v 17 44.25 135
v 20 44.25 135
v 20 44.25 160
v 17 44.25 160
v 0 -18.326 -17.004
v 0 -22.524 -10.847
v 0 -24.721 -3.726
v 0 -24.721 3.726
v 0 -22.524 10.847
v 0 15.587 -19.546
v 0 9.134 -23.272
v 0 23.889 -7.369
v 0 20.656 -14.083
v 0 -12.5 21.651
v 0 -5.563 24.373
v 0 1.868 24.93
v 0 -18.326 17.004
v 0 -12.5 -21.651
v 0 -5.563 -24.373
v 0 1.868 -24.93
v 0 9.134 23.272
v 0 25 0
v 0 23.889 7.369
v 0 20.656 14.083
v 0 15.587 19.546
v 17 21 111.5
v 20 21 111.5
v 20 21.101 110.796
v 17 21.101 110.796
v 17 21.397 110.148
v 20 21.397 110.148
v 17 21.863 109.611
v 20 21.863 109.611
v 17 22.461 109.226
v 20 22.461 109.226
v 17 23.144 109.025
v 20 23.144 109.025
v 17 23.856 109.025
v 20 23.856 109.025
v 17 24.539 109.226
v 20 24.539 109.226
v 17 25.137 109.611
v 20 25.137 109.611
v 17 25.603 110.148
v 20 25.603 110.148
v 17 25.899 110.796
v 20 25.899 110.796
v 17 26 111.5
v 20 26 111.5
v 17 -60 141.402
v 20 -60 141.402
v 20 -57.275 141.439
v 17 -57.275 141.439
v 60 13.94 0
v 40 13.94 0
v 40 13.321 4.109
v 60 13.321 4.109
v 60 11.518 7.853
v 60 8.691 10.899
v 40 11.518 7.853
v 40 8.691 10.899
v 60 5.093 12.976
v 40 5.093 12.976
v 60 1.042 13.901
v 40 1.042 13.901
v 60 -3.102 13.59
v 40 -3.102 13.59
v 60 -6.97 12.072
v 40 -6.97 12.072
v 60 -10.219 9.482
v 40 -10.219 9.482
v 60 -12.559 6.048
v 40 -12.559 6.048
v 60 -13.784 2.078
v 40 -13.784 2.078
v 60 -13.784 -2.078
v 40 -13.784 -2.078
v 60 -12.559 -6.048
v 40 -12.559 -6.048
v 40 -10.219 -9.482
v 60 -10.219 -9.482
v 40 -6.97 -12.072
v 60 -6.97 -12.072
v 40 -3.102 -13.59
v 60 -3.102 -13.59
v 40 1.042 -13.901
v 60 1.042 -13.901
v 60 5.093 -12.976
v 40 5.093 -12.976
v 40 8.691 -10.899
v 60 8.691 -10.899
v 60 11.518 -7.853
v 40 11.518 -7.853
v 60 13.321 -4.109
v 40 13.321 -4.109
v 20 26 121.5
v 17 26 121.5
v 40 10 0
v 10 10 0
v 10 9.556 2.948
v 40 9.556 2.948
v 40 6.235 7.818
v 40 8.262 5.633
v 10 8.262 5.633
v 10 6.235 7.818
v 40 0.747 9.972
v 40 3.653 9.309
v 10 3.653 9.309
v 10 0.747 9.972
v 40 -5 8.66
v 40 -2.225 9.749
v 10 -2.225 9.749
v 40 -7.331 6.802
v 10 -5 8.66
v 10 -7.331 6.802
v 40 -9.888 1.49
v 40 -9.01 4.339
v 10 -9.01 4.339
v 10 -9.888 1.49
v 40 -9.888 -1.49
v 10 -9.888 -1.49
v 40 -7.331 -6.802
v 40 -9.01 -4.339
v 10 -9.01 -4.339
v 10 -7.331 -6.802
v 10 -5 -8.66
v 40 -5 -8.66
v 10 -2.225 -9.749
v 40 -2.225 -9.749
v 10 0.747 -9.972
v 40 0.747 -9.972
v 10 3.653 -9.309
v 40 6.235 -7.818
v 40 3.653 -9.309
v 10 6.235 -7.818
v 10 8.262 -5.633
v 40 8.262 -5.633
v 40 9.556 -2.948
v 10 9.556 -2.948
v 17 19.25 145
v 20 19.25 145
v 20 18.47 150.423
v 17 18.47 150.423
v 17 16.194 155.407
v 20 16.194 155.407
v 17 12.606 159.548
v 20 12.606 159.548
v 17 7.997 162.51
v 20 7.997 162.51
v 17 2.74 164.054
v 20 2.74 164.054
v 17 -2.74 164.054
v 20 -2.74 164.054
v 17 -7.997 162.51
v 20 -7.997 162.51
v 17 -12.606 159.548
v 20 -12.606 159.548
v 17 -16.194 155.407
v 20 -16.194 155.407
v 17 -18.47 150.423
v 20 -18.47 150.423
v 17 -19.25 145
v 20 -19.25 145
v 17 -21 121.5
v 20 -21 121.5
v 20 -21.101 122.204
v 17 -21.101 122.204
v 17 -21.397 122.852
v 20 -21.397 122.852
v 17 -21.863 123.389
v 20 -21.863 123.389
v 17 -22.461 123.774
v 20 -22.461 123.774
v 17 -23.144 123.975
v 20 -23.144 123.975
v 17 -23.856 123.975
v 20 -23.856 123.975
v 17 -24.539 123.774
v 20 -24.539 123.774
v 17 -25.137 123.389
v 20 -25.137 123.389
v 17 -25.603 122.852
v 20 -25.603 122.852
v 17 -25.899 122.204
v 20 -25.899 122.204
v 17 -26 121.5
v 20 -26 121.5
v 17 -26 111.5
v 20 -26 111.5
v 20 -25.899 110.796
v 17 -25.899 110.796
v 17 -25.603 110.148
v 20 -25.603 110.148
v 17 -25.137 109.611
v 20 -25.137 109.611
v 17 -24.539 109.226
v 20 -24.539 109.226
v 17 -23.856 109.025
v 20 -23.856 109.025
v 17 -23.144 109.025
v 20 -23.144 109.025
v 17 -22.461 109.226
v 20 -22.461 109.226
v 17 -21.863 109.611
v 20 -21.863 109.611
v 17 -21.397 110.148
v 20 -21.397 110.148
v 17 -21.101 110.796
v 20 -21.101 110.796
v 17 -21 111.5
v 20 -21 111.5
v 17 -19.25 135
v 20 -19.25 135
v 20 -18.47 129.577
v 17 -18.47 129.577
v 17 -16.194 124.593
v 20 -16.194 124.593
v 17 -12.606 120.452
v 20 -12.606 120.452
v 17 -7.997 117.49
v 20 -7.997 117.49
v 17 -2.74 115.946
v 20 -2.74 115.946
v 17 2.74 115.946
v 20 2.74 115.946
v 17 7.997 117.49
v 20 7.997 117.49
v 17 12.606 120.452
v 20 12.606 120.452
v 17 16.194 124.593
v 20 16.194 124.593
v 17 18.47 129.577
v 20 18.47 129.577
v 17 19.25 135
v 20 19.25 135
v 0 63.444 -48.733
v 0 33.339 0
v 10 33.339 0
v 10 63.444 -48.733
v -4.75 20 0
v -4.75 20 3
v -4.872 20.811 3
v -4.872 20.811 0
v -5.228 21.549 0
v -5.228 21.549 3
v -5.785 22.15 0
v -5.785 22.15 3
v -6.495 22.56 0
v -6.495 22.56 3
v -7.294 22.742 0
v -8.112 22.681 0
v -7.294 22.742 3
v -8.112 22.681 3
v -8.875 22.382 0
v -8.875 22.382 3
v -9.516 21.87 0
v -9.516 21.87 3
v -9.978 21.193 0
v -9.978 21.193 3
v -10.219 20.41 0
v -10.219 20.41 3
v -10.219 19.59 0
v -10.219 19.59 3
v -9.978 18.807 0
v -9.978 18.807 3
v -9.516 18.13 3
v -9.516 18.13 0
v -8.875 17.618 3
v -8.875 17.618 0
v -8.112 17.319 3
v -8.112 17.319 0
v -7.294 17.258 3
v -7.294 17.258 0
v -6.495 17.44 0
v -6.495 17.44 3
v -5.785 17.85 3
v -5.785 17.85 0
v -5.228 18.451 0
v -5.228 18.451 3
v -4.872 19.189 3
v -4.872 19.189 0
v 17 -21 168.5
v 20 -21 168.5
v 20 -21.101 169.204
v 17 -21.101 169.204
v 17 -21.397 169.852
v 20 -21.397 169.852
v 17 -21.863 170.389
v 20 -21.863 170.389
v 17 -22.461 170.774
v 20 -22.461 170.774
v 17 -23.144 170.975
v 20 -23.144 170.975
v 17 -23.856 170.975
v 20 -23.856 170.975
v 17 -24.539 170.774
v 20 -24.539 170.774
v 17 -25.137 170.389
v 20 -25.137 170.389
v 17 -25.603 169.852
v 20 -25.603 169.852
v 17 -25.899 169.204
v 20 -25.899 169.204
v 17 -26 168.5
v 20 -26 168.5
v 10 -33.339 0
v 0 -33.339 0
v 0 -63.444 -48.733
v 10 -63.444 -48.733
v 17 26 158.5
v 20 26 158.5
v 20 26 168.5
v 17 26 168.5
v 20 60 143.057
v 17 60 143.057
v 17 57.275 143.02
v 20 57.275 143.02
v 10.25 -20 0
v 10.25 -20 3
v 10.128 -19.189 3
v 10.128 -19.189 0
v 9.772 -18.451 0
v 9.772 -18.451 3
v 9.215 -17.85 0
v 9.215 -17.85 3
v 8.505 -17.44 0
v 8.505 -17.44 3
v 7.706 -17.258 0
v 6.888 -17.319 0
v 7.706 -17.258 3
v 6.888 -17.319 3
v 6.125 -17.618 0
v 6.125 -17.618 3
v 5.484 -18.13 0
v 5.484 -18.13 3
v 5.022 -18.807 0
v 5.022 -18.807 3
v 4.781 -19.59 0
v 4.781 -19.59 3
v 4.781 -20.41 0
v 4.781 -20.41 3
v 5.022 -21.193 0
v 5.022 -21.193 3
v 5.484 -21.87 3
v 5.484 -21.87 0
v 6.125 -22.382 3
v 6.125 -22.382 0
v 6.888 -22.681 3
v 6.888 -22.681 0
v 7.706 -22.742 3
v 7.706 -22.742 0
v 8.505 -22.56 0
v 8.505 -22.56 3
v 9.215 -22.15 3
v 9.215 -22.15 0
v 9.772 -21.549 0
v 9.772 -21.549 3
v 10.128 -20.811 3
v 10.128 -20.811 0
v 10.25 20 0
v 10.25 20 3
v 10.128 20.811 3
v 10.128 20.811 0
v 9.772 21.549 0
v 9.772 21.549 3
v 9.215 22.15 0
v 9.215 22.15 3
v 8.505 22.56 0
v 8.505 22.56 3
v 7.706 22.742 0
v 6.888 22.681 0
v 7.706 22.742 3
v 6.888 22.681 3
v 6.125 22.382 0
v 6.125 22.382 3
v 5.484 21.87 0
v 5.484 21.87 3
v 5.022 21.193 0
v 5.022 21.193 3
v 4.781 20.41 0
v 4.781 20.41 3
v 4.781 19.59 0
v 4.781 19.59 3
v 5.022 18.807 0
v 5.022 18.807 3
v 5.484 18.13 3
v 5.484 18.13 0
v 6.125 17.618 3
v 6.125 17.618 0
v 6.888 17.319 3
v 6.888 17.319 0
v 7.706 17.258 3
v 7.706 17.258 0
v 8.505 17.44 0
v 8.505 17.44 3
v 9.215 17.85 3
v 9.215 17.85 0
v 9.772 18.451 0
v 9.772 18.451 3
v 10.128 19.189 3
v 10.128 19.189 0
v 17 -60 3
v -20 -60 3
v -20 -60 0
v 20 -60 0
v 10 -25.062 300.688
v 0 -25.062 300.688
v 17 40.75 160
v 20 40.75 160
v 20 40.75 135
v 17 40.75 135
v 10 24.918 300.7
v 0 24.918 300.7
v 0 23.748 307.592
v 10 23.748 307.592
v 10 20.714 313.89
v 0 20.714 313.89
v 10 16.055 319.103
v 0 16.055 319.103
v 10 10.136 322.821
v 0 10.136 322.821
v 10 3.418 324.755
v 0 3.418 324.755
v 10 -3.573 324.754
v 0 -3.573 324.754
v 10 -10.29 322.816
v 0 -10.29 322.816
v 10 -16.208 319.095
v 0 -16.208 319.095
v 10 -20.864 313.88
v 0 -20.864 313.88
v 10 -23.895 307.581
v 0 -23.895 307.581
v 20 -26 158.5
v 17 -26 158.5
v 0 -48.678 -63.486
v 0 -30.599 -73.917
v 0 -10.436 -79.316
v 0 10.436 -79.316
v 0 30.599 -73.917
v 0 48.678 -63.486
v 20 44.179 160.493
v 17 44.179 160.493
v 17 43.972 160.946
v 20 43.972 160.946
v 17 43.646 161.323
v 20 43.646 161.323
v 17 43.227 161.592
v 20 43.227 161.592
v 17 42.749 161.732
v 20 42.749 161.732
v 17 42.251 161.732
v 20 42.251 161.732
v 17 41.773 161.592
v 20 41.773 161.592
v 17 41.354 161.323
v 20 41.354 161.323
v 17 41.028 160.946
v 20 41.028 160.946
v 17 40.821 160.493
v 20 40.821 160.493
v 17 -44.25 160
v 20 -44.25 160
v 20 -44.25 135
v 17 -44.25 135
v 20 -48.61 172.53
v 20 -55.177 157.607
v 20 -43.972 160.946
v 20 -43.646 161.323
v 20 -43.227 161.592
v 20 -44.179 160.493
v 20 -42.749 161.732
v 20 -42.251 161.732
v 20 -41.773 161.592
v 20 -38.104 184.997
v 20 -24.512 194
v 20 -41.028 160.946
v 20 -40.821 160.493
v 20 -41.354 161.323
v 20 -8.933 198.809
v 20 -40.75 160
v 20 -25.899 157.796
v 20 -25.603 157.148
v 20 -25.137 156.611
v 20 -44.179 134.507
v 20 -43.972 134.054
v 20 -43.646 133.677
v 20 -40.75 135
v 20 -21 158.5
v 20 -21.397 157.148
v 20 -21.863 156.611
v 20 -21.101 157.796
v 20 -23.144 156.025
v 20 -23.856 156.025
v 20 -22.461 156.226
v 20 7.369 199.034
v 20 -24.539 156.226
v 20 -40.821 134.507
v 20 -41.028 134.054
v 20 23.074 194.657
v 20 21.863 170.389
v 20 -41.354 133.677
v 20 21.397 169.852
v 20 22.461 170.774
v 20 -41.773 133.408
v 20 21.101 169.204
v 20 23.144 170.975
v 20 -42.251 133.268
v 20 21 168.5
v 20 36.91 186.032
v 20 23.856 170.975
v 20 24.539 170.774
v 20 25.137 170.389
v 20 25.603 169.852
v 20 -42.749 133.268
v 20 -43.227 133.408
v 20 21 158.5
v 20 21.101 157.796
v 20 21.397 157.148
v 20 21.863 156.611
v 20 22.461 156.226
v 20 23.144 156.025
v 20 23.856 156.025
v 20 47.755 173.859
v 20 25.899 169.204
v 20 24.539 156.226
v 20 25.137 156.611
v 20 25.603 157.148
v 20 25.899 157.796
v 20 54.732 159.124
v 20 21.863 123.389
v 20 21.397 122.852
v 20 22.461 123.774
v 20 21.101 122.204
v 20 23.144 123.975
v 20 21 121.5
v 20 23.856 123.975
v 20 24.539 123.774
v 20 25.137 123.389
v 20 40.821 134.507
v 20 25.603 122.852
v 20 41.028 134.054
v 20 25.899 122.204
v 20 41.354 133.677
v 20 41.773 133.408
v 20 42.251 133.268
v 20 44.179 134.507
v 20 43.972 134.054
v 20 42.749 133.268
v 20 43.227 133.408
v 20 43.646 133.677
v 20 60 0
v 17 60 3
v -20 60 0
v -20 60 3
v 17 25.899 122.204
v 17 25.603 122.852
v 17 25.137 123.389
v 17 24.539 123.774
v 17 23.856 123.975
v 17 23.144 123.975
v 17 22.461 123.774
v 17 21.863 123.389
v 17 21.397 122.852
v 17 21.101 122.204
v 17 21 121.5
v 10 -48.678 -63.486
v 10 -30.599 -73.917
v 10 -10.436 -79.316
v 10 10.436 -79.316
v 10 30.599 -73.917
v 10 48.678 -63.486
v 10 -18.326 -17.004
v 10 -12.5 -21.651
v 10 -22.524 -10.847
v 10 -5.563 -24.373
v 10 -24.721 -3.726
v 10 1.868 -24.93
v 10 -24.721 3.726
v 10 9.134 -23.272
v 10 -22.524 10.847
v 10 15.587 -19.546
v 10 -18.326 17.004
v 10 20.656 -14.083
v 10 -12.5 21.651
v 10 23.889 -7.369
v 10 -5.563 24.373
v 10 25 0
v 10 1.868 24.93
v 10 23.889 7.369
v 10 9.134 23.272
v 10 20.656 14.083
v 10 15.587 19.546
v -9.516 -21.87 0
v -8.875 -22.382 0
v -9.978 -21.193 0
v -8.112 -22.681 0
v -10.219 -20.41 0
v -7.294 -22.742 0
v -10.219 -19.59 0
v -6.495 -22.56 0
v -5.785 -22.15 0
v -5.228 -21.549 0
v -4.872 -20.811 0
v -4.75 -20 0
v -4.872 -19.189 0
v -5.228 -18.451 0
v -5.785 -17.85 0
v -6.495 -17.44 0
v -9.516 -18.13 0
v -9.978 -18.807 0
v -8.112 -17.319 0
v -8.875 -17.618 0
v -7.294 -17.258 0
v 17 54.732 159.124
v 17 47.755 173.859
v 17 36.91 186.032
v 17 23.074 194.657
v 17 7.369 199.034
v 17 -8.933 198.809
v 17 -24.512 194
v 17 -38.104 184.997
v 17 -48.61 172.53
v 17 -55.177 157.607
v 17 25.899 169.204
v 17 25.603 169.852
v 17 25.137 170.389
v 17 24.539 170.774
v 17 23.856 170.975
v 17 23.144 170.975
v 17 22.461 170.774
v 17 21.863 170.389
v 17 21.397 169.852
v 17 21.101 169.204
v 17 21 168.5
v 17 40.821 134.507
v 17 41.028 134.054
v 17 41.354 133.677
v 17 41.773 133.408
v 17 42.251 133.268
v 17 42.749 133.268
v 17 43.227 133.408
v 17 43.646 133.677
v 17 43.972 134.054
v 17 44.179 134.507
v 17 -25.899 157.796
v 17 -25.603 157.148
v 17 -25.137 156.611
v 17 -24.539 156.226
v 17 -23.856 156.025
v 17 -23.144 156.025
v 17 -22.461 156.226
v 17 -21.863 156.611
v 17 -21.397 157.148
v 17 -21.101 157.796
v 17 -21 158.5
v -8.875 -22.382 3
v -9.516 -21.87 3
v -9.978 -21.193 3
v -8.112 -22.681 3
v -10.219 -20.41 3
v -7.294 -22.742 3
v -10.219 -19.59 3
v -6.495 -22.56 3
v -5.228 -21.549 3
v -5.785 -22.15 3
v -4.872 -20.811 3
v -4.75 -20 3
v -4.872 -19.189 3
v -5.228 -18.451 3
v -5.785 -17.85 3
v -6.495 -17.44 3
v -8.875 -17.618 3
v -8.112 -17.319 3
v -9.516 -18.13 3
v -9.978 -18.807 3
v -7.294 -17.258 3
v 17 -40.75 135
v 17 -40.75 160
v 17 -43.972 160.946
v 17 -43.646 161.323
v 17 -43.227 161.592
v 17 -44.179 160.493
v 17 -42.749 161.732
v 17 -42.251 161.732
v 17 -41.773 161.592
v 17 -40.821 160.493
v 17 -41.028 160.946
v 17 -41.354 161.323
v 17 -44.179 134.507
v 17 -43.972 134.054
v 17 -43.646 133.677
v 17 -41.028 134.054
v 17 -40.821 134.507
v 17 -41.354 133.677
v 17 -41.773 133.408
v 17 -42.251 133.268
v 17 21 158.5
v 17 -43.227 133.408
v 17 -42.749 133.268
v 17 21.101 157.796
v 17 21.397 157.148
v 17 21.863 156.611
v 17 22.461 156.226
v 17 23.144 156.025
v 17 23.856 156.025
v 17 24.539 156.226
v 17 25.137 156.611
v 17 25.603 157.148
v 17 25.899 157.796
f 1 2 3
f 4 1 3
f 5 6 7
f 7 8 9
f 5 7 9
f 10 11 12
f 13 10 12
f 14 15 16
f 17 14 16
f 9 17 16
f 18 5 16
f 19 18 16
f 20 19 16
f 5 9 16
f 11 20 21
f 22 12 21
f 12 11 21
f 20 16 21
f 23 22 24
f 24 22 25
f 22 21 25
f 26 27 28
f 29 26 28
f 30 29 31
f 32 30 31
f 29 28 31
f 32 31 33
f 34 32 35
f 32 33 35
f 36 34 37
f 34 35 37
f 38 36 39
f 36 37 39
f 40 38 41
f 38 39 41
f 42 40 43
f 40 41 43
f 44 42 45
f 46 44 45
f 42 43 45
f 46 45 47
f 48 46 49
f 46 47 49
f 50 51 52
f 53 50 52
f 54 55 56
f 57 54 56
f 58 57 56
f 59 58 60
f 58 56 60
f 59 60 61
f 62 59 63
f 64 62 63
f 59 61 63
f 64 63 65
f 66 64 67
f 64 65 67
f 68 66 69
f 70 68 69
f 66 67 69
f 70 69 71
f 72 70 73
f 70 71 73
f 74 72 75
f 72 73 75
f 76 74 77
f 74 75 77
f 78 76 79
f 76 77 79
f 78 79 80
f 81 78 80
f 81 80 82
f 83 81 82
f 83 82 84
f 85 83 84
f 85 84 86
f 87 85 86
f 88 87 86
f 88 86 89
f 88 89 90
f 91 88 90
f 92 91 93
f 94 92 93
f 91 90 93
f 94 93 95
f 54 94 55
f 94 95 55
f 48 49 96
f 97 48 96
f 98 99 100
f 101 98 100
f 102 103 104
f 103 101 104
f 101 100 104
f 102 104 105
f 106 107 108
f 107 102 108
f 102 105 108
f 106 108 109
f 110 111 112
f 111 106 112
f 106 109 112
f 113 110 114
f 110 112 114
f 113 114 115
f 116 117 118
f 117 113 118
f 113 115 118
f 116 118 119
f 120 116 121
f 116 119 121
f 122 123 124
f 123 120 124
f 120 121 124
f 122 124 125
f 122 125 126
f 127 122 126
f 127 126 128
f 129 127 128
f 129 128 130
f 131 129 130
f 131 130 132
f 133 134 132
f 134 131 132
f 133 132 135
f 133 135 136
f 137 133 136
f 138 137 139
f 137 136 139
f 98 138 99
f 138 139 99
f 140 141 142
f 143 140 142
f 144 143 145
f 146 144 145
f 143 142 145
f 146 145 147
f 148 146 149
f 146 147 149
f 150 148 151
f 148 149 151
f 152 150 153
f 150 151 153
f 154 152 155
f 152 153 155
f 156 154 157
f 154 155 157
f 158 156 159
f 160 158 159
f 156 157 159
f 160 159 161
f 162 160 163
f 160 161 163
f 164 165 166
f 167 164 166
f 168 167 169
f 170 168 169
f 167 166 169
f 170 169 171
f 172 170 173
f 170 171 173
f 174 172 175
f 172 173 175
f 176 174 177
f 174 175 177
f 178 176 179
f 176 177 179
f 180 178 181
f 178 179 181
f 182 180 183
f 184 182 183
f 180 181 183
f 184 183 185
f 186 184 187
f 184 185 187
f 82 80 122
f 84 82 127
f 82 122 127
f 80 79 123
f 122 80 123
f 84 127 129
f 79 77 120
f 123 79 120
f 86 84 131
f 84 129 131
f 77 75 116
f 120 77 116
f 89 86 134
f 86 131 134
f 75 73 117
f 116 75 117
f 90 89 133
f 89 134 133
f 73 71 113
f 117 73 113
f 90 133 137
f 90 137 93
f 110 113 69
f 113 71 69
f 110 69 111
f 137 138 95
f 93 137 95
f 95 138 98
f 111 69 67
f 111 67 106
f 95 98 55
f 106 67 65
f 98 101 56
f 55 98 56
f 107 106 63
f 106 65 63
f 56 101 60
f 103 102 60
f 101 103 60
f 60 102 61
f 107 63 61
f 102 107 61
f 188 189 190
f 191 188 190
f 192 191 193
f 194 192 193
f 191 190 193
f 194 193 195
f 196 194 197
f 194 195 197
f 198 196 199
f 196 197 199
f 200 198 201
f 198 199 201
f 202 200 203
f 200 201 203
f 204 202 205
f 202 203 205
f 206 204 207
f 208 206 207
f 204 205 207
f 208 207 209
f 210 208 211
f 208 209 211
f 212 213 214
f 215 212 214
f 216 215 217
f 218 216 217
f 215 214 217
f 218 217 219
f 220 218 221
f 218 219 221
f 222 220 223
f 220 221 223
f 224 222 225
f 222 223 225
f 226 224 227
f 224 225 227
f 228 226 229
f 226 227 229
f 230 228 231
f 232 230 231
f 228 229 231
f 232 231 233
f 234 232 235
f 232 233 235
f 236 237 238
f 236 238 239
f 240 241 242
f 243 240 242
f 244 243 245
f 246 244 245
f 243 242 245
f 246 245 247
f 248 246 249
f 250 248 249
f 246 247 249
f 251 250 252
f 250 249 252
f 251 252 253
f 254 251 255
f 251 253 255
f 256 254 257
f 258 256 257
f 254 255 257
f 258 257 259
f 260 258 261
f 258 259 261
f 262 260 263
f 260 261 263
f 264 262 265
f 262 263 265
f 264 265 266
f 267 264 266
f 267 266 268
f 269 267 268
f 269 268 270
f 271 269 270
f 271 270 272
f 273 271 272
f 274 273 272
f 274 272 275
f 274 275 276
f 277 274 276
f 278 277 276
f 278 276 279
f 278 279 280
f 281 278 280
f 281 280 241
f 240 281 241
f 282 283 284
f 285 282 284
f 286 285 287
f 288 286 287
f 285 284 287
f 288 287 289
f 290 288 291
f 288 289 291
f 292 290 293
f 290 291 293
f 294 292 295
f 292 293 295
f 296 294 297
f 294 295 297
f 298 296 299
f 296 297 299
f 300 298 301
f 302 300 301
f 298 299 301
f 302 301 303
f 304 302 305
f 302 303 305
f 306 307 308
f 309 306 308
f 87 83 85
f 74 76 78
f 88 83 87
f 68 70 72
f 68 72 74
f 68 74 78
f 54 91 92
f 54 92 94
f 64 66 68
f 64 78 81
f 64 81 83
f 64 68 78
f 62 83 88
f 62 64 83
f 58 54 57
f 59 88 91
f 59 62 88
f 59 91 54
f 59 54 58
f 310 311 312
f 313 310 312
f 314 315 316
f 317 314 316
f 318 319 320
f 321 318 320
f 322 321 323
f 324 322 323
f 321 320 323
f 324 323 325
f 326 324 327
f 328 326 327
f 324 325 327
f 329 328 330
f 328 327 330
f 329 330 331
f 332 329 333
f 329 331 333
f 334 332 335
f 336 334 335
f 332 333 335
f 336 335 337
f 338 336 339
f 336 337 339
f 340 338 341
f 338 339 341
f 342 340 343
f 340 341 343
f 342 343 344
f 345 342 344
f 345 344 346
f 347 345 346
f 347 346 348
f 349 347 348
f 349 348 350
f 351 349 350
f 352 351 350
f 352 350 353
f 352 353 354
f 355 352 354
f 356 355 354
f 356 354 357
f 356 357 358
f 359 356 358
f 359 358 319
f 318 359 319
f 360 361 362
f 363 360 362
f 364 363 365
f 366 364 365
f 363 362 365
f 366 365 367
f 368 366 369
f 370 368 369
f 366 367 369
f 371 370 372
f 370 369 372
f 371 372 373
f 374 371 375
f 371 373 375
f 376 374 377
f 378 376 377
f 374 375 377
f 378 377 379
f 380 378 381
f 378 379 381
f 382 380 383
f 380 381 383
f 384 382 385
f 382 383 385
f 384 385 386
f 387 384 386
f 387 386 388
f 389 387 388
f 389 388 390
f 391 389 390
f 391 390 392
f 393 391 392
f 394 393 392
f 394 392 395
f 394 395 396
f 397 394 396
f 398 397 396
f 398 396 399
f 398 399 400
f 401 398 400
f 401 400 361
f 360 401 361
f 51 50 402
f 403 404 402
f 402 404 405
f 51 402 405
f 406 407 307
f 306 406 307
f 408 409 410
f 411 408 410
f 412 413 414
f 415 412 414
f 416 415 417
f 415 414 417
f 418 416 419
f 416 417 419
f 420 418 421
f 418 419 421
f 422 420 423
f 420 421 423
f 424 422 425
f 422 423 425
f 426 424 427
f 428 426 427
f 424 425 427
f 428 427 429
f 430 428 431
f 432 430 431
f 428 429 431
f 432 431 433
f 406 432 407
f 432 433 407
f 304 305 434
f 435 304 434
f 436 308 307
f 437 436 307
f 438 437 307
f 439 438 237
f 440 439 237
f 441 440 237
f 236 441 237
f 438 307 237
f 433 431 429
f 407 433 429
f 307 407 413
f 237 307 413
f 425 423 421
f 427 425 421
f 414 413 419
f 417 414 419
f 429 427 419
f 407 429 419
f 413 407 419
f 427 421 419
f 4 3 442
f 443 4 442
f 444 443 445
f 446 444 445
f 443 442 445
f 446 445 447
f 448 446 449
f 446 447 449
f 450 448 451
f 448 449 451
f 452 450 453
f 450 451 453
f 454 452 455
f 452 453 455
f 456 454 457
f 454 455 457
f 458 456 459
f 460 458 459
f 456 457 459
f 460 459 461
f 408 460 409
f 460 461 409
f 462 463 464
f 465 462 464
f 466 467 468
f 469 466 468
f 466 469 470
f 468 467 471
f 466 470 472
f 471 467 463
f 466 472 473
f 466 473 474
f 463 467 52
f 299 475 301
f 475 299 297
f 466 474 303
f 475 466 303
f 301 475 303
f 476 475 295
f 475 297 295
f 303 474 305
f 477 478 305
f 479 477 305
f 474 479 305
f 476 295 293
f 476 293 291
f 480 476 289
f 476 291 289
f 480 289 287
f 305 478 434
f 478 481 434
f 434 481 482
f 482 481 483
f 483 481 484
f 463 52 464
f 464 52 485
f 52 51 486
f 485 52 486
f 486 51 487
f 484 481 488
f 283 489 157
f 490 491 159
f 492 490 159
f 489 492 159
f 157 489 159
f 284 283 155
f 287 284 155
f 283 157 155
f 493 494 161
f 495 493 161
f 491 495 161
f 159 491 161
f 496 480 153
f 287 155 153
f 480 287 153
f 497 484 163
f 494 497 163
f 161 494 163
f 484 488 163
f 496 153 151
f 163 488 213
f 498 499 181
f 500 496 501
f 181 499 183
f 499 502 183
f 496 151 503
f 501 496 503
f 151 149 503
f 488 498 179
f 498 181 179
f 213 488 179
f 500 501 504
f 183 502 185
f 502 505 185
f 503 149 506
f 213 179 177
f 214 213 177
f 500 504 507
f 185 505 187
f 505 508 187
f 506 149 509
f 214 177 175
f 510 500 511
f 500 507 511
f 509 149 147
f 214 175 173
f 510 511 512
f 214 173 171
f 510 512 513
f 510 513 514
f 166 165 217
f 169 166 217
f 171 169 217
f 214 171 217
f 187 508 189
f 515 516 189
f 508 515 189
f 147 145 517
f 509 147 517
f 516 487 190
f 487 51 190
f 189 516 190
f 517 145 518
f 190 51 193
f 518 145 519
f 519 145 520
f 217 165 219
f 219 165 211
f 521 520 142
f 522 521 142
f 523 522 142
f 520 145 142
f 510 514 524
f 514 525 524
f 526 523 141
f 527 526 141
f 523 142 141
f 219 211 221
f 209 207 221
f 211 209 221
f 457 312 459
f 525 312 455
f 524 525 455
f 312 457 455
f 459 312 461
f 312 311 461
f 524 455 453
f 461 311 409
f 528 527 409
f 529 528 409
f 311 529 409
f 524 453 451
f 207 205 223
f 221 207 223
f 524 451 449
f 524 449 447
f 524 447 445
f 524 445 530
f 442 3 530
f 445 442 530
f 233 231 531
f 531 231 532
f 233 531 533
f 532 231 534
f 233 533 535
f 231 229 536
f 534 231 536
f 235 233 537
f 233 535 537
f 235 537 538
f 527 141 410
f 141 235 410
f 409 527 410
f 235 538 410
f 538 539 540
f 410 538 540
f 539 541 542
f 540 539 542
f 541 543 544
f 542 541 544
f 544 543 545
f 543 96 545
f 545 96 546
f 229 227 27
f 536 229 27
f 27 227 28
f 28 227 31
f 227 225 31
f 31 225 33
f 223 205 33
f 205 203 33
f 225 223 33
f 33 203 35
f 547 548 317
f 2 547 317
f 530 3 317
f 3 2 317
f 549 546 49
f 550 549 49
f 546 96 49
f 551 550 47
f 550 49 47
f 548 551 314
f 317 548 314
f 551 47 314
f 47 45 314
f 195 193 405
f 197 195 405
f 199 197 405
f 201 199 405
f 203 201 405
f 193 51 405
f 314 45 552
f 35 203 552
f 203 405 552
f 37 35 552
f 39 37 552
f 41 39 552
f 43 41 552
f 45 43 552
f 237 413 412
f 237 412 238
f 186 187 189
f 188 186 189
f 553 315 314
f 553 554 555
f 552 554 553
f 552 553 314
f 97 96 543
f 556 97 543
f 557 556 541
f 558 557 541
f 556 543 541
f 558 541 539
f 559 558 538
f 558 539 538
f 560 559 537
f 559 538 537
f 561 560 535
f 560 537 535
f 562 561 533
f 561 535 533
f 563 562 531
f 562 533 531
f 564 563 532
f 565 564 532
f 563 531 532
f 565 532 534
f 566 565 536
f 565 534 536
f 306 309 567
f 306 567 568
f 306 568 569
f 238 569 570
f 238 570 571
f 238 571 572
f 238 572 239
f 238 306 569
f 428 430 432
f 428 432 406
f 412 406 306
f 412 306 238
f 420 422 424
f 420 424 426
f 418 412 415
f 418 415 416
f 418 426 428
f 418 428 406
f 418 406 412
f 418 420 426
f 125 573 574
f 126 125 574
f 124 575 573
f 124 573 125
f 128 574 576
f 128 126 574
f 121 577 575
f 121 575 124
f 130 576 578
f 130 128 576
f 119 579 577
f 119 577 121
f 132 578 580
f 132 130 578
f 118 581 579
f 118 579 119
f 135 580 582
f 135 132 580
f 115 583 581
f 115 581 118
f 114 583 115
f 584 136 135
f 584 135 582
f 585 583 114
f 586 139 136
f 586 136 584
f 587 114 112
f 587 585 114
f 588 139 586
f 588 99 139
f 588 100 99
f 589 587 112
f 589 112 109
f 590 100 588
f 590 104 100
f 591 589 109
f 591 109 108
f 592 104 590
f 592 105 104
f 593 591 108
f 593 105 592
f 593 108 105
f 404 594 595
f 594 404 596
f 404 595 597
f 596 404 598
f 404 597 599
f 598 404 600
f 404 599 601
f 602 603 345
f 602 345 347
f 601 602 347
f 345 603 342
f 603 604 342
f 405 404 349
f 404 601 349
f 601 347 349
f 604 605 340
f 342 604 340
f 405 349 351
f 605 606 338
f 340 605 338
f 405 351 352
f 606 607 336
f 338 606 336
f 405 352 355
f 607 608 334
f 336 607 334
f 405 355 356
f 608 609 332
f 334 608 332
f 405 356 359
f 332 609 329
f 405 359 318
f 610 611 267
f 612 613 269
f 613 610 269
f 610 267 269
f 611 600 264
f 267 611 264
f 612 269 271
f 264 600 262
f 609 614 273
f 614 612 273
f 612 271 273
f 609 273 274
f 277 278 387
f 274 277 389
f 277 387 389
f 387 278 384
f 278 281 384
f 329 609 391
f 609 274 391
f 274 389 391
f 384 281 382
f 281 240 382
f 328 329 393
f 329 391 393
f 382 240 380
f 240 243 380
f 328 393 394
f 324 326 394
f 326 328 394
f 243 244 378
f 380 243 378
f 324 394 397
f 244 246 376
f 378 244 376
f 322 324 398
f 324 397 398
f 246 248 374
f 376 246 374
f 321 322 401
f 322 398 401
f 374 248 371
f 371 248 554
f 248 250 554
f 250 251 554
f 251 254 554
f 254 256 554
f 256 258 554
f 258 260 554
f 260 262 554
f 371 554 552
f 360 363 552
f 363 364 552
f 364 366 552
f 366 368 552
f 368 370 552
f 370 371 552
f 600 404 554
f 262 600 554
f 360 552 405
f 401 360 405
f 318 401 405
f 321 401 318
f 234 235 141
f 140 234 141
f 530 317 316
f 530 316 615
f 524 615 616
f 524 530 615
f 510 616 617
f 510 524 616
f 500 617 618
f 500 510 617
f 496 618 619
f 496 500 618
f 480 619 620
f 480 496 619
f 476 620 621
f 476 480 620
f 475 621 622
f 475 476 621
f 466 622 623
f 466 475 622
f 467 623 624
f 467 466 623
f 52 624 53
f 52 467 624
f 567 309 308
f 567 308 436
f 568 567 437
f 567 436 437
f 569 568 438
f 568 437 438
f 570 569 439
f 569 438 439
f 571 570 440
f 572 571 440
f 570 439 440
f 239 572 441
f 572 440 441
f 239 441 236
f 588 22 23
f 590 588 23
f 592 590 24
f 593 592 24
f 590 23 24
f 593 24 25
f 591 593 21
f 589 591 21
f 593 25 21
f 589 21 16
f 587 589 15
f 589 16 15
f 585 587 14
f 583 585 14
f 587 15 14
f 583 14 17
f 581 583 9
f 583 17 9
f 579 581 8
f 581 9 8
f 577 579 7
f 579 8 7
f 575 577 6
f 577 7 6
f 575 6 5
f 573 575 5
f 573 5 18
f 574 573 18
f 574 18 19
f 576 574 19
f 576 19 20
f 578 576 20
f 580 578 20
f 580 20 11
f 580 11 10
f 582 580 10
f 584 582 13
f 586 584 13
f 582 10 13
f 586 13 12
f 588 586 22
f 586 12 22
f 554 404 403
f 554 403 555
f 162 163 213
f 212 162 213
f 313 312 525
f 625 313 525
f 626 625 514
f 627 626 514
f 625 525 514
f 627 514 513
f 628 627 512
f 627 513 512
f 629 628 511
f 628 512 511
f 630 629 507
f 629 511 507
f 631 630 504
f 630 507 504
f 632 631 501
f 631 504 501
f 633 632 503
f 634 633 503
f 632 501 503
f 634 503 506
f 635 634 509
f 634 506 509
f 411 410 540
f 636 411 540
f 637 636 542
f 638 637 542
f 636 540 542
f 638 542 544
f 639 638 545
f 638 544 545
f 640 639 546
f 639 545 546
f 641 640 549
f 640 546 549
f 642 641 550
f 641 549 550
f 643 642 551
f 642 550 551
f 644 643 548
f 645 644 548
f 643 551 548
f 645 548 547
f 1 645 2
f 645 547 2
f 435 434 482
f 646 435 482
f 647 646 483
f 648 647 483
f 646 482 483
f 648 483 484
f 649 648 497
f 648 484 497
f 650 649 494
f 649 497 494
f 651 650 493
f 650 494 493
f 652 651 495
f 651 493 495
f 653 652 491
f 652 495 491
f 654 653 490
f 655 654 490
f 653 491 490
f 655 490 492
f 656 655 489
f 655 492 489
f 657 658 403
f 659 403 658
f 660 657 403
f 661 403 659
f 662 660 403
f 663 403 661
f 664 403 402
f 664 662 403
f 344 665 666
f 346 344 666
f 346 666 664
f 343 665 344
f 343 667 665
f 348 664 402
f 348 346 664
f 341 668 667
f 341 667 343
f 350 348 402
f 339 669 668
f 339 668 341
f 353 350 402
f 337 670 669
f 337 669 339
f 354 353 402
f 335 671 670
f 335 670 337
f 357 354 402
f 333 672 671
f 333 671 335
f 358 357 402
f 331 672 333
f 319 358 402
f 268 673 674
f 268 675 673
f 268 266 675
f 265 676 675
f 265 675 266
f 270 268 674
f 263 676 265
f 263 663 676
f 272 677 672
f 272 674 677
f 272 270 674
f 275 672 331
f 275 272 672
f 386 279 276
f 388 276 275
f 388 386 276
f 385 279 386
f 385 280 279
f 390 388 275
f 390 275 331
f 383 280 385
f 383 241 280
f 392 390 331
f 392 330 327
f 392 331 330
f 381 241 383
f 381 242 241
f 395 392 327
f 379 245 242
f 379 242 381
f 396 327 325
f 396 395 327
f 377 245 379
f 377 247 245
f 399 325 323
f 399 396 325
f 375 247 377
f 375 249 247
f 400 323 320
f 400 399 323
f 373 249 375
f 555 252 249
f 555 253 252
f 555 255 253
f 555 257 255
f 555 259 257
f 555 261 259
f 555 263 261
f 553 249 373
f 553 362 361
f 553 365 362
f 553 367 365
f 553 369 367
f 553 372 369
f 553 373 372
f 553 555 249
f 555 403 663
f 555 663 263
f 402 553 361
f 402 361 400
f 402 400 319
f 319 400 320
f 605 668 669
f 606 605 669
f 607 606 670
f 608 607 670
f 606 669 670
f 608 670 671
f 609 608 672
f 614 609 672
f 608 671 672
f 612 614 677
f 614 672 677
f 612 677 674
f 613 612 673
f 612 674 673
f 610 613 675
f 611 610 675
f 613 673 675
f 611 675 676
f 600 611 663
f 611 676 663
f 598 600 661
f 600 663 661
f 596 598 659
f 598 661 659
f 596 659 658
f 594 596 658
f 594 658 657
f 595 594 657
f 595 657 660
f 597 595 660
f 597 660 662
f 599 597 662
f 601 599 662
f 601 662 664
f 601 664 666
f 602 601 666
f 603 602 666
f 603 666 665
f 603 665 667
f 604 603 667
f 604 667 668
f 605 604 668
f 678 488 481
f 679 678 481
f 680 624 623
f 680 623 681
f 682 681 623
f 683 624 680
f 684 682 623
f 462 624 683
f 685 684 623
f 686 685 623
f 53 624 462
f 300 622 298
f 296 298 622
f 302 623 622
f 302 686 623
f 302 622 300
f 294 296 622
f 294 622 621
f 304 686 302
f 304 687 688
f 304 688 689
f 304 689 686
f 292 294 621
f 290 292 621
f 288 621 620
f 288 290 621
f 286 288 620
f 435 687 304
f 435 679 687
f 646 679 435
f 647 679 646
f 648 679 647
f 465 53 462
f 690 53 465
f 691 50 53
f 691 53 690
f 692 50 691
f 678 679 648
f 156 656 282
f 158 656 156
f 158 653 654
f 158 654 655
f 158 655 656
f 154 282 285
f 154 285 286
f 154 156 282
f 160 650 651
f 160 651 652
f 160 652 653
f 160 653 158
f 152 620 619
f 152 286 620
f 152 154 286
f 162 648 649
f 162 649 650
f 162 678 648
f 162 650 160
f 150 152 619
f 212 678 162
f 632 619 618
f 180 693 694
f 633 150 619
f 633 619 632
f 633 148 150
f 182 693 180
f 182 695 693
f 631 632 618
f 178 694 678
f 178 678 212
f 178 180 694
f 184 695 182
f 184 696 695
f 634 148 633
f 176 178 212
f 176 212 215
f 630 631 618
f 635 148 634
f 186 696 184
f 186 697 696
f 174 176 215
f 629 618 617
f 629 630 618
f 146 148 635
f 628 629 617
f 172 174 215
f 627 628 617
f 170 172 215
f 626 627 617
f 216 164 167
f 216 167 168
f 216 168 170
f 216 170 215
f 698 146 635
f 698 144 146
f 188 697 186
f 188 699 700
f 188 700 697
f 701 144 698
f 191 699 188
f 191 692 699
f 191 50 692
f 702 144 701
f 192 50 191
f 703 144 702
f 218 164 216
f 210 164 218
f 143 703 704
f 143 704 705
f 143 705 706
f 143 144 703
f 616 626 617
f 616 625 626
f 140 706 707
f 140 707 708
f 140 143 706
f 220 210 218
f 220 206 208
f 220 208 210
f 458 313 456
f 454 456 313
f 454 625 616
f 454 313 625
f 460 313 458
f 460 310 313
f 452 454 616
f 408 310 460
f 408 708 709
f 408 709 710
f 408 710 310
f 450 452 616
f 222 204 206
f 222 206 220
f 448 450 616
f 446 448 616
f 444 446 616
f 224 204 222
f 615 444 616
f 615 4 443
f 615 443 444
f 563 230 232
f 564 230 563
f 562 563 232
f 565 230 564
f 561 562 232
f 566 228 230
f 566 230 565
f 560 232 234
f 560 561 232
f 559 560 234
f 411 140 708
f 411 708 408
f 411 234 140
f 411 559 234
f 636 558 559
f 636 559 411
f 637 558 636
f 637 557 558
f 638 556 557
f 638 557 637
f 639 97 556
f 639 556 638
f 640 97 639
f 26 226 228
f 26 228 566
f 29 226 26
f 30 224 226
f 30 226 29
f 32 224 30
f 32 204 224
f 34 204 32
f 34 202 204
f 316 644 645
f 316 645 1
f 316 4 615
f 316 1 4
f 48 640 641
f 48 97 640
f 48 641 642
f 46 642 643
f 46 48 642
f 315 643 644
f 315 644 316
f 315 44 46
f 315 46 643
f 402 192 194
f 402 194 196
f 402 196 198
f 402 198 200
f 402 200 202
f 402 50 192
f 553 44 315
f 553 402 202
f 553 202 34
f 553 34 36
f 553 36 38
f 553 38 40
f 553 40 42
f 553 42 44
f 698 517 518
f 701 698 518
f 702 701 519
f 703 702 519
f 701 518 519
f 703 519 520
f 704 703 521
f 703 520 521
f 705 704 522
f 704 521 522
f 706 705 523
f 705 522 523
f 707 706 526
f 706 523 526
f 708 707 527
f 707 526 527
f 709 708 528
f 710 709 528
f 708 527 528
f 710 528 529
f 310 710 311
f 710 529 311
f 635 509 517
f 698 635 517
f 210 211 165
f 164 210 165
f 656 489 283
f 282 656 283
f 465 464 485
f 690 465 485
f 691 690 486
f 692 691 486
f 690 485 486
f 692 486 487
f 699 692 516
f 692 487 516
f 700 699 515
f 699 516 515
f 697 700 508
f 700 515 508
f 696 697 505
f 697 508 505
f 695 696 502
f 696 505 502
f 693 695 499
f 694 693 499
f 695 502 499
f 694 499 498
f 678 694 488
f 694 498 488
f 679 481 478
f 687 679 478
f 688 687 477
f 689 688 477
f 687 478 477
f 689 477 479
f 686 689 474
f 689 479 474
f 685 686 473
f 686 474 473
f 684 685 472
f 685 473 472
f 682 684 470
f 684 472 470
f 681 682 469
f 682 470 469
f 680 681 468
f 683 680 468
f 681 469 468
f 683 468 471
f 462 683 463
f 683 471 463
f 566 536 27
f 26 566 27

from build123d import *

# Parameters (mm, degrees)
SKETCH_W        = 40
SKETCH_H        = 120
PAD_DEPTH       = 3
SKETCH001_R     = 2.75
HOLE_DEPTH      = 25
SKETCH002_W     = 3
SKETCH002_H     = 120
PAD001_DEPTH    = 200
POCKET_DEPTH    = 5
POCKET001_DEPTH = 5
PAD002_DEPTH    = 10
SKETCH106_R     = 25
PAD003_DEPTH    = 10
SKETCH107_R     = 10
PAD004_DEPTH    = 50
SKETCH108_R     = 13.939896
PAD005_DEPTH    = 20


with BuildPart() as b_y_axis_base_left:
    # Sketch → Pad (new body)
    with BuildSketch(Plane.XY):
        Rectangle(SKETCH_W, SKETCH_H)
    extrude(amount=PAD_DEPTH)

    # Sketch001 → Hole (cut)
    with BuildSketch(Plane.XY.offset(3)):
        with Locations((-7.5, 20)):
            Circle(SKETCH001_R)
        with Locations((7.5, 20)):
            Circle(SKETCH001_R)
        with Locations((-7.5, -20)):
            Circle(SKETCH001_R)
        with Locations((7.5, -20)):
            Circle(SKETCH001_R)
    extrude(amount=-HOLE_DEPTH, mode=Mode.SUBTRACT)

    # Sketch002 → Pad001 (join)
    with BuildSketch(Plane.XY.offset(3)):
        with Locations((18.5, 0)):
            Rectangle(SKETCH002_W, SKETCH002_H)
    extrude(amount=PAD001_DEPTH)

    # Sketch104 (on Part) → Pocket (cut)
    with BuildSketch(Plane(origin=(20, 0, 140), x_dir=(0, 1, 0), z_dir=(1, 0, 0))):
        with BuildLine():
            ThreePointArc((-21, 28.5), (-23.5, 31), (-26, 28.5))
            Line((-26, 28.5), (-26, 18.5))
            ThreePointArc((-26, 18.5), (-23.5, 16), (-21, 18.5))
            Line((-21, 18.5), (-21, 28.5))
        make_face()
        with BuildLine():
            ThreePointArc((26, 28.5), (23.5, 31), (21, 28.5))
            Line((21, 28.5), (21, 18.5))
            ThreePointArc((21, 18.5), (23.5, 16), (26, 18.5))
            Line((26, 18.5), (26, 28.5))
        make_face()
        with BuildLine():
            ThreePointArc((26, -18.5), (23.5, -16), (21, -18.5))
            Line((21, -18.5), (21, -28.5))
            ThreePointArc((21, -28.5), (23.5, -31), (26, -28.5))
            Line((26, -28.5), (26, -18.5))
        make_face()
        with BuildLine():
            ThreePointArc((-21, -18.5), (-23.5, -16), (-26, -18.5))
            Line((-26, -18.5), (-26, -28.5))
            ThreePointArc((-26, -28.5), (-23.5, -31), (-21, -28.5))
            Line((-21, -28.5), (-21, -18.5))
        make_face()
        with BuildLine():
            ThreePointArc((19.25, 5), (0, 24.25), (-19.25, 5))
            Line((-19.25, 5), (-19.25, -5))
            ThreePointArc((-19.25, -5), (0, -24.25), (19.25, -5))
            Line((19.25, -5), (19.25, 5))
        make_face()
        with BuildLine():
            ThreePointArc((-40.75, 20), (-42.5, 21.75), (-44.25, 20))
            Line((-44.25, 20), (-44.25, -5))
            ThreePointArc((-44.25, -5), (-42.5, -6.75), (-40.75, -5))
            Line((-40.75, -5), (-40.75, 20))
        make_face()
        with BuildLine():
            ThreePointArc((44.25, 20), (42.5, 21.75), (40.75, 20))
            Line((40.75, 20), (40.75, -5))
            ThreePointArc((40.75, -5), (42.5, -6.75), (44.25, -5))
            Line((44.25, -5), (44.25, 20))
        make_face()
    extrude(amount=-POCKET_DEPTH, mode=Mode.SUBTRACT)

    # Sketch105 → Pocket001 (cut)
    with BuildSketch(Plane.YZ.offset(20)):
        with BuildLine():
            ThreePointArc((113.108162, 143.789978), (-1.560529, 255.337611), (-113.108162, 140.668919))
            Line((-113.108162, 140.668919), (-57.274676, 141.439242))
            ThreePointArc((57.274676, 143.019655), (-0.790207, 199.504125), (-57.274676, 141.439242))
            Line((113.108162, 143.789978), (57.274676, 143.019655))
        make_face()
    extrude(amount=-POCKET001_DEPTH, mode=Mode.SUBTRACT)


with BuildPart() as b_y_axis_arm_left:
    # Sketch003 → Pad002 (new body)
    with BuildSketch(Plane.YZ):
        with BuildLine():
            ThreePointArc((24.918394, 300.699796), (-0.077775, 324.999999), (-25.062344, 300.687869))
            Line((-25.062344, 300.687869), (-33.338837, 0))
            Line((-33.338837, 0), (-63.443909, -48.732643))
            ThreePointArc((-63.443909, -48.732643), (0, -80), (63.443909, -48.732643))
            Line((33.338837, 0), (63.443909, -48.732643))
            Line((24.918394, 300.699796), (33.338837, 0))
        make_face()
    extrude(amount=PAD002_DEPTH)


with BuildPart() as body:
    # Sketch106 → Pad003 (new body)
    with BuildSketch(Plane.YZ):
        Circle(SKETCH106_R)
    extrude(amount=PAD003_DEPTH)

    # Sketch107 → Pad004 (join)
    with BuildSketch(Plane.YZ):
        Circle(SKETCH107_R)
    extrude(amount=PAD004_DEPTH)

    # Sketch108 → Pad005 (join)
    with BuildSketch(Plane.YZ.offset(40)):
        Circle(SKETCH108_R)
    extrude(amount=PAD005_DEPTH)


solid = Compound([b_y_axis_base_left.part, b_y_axis_arm_left.part, body.part])
